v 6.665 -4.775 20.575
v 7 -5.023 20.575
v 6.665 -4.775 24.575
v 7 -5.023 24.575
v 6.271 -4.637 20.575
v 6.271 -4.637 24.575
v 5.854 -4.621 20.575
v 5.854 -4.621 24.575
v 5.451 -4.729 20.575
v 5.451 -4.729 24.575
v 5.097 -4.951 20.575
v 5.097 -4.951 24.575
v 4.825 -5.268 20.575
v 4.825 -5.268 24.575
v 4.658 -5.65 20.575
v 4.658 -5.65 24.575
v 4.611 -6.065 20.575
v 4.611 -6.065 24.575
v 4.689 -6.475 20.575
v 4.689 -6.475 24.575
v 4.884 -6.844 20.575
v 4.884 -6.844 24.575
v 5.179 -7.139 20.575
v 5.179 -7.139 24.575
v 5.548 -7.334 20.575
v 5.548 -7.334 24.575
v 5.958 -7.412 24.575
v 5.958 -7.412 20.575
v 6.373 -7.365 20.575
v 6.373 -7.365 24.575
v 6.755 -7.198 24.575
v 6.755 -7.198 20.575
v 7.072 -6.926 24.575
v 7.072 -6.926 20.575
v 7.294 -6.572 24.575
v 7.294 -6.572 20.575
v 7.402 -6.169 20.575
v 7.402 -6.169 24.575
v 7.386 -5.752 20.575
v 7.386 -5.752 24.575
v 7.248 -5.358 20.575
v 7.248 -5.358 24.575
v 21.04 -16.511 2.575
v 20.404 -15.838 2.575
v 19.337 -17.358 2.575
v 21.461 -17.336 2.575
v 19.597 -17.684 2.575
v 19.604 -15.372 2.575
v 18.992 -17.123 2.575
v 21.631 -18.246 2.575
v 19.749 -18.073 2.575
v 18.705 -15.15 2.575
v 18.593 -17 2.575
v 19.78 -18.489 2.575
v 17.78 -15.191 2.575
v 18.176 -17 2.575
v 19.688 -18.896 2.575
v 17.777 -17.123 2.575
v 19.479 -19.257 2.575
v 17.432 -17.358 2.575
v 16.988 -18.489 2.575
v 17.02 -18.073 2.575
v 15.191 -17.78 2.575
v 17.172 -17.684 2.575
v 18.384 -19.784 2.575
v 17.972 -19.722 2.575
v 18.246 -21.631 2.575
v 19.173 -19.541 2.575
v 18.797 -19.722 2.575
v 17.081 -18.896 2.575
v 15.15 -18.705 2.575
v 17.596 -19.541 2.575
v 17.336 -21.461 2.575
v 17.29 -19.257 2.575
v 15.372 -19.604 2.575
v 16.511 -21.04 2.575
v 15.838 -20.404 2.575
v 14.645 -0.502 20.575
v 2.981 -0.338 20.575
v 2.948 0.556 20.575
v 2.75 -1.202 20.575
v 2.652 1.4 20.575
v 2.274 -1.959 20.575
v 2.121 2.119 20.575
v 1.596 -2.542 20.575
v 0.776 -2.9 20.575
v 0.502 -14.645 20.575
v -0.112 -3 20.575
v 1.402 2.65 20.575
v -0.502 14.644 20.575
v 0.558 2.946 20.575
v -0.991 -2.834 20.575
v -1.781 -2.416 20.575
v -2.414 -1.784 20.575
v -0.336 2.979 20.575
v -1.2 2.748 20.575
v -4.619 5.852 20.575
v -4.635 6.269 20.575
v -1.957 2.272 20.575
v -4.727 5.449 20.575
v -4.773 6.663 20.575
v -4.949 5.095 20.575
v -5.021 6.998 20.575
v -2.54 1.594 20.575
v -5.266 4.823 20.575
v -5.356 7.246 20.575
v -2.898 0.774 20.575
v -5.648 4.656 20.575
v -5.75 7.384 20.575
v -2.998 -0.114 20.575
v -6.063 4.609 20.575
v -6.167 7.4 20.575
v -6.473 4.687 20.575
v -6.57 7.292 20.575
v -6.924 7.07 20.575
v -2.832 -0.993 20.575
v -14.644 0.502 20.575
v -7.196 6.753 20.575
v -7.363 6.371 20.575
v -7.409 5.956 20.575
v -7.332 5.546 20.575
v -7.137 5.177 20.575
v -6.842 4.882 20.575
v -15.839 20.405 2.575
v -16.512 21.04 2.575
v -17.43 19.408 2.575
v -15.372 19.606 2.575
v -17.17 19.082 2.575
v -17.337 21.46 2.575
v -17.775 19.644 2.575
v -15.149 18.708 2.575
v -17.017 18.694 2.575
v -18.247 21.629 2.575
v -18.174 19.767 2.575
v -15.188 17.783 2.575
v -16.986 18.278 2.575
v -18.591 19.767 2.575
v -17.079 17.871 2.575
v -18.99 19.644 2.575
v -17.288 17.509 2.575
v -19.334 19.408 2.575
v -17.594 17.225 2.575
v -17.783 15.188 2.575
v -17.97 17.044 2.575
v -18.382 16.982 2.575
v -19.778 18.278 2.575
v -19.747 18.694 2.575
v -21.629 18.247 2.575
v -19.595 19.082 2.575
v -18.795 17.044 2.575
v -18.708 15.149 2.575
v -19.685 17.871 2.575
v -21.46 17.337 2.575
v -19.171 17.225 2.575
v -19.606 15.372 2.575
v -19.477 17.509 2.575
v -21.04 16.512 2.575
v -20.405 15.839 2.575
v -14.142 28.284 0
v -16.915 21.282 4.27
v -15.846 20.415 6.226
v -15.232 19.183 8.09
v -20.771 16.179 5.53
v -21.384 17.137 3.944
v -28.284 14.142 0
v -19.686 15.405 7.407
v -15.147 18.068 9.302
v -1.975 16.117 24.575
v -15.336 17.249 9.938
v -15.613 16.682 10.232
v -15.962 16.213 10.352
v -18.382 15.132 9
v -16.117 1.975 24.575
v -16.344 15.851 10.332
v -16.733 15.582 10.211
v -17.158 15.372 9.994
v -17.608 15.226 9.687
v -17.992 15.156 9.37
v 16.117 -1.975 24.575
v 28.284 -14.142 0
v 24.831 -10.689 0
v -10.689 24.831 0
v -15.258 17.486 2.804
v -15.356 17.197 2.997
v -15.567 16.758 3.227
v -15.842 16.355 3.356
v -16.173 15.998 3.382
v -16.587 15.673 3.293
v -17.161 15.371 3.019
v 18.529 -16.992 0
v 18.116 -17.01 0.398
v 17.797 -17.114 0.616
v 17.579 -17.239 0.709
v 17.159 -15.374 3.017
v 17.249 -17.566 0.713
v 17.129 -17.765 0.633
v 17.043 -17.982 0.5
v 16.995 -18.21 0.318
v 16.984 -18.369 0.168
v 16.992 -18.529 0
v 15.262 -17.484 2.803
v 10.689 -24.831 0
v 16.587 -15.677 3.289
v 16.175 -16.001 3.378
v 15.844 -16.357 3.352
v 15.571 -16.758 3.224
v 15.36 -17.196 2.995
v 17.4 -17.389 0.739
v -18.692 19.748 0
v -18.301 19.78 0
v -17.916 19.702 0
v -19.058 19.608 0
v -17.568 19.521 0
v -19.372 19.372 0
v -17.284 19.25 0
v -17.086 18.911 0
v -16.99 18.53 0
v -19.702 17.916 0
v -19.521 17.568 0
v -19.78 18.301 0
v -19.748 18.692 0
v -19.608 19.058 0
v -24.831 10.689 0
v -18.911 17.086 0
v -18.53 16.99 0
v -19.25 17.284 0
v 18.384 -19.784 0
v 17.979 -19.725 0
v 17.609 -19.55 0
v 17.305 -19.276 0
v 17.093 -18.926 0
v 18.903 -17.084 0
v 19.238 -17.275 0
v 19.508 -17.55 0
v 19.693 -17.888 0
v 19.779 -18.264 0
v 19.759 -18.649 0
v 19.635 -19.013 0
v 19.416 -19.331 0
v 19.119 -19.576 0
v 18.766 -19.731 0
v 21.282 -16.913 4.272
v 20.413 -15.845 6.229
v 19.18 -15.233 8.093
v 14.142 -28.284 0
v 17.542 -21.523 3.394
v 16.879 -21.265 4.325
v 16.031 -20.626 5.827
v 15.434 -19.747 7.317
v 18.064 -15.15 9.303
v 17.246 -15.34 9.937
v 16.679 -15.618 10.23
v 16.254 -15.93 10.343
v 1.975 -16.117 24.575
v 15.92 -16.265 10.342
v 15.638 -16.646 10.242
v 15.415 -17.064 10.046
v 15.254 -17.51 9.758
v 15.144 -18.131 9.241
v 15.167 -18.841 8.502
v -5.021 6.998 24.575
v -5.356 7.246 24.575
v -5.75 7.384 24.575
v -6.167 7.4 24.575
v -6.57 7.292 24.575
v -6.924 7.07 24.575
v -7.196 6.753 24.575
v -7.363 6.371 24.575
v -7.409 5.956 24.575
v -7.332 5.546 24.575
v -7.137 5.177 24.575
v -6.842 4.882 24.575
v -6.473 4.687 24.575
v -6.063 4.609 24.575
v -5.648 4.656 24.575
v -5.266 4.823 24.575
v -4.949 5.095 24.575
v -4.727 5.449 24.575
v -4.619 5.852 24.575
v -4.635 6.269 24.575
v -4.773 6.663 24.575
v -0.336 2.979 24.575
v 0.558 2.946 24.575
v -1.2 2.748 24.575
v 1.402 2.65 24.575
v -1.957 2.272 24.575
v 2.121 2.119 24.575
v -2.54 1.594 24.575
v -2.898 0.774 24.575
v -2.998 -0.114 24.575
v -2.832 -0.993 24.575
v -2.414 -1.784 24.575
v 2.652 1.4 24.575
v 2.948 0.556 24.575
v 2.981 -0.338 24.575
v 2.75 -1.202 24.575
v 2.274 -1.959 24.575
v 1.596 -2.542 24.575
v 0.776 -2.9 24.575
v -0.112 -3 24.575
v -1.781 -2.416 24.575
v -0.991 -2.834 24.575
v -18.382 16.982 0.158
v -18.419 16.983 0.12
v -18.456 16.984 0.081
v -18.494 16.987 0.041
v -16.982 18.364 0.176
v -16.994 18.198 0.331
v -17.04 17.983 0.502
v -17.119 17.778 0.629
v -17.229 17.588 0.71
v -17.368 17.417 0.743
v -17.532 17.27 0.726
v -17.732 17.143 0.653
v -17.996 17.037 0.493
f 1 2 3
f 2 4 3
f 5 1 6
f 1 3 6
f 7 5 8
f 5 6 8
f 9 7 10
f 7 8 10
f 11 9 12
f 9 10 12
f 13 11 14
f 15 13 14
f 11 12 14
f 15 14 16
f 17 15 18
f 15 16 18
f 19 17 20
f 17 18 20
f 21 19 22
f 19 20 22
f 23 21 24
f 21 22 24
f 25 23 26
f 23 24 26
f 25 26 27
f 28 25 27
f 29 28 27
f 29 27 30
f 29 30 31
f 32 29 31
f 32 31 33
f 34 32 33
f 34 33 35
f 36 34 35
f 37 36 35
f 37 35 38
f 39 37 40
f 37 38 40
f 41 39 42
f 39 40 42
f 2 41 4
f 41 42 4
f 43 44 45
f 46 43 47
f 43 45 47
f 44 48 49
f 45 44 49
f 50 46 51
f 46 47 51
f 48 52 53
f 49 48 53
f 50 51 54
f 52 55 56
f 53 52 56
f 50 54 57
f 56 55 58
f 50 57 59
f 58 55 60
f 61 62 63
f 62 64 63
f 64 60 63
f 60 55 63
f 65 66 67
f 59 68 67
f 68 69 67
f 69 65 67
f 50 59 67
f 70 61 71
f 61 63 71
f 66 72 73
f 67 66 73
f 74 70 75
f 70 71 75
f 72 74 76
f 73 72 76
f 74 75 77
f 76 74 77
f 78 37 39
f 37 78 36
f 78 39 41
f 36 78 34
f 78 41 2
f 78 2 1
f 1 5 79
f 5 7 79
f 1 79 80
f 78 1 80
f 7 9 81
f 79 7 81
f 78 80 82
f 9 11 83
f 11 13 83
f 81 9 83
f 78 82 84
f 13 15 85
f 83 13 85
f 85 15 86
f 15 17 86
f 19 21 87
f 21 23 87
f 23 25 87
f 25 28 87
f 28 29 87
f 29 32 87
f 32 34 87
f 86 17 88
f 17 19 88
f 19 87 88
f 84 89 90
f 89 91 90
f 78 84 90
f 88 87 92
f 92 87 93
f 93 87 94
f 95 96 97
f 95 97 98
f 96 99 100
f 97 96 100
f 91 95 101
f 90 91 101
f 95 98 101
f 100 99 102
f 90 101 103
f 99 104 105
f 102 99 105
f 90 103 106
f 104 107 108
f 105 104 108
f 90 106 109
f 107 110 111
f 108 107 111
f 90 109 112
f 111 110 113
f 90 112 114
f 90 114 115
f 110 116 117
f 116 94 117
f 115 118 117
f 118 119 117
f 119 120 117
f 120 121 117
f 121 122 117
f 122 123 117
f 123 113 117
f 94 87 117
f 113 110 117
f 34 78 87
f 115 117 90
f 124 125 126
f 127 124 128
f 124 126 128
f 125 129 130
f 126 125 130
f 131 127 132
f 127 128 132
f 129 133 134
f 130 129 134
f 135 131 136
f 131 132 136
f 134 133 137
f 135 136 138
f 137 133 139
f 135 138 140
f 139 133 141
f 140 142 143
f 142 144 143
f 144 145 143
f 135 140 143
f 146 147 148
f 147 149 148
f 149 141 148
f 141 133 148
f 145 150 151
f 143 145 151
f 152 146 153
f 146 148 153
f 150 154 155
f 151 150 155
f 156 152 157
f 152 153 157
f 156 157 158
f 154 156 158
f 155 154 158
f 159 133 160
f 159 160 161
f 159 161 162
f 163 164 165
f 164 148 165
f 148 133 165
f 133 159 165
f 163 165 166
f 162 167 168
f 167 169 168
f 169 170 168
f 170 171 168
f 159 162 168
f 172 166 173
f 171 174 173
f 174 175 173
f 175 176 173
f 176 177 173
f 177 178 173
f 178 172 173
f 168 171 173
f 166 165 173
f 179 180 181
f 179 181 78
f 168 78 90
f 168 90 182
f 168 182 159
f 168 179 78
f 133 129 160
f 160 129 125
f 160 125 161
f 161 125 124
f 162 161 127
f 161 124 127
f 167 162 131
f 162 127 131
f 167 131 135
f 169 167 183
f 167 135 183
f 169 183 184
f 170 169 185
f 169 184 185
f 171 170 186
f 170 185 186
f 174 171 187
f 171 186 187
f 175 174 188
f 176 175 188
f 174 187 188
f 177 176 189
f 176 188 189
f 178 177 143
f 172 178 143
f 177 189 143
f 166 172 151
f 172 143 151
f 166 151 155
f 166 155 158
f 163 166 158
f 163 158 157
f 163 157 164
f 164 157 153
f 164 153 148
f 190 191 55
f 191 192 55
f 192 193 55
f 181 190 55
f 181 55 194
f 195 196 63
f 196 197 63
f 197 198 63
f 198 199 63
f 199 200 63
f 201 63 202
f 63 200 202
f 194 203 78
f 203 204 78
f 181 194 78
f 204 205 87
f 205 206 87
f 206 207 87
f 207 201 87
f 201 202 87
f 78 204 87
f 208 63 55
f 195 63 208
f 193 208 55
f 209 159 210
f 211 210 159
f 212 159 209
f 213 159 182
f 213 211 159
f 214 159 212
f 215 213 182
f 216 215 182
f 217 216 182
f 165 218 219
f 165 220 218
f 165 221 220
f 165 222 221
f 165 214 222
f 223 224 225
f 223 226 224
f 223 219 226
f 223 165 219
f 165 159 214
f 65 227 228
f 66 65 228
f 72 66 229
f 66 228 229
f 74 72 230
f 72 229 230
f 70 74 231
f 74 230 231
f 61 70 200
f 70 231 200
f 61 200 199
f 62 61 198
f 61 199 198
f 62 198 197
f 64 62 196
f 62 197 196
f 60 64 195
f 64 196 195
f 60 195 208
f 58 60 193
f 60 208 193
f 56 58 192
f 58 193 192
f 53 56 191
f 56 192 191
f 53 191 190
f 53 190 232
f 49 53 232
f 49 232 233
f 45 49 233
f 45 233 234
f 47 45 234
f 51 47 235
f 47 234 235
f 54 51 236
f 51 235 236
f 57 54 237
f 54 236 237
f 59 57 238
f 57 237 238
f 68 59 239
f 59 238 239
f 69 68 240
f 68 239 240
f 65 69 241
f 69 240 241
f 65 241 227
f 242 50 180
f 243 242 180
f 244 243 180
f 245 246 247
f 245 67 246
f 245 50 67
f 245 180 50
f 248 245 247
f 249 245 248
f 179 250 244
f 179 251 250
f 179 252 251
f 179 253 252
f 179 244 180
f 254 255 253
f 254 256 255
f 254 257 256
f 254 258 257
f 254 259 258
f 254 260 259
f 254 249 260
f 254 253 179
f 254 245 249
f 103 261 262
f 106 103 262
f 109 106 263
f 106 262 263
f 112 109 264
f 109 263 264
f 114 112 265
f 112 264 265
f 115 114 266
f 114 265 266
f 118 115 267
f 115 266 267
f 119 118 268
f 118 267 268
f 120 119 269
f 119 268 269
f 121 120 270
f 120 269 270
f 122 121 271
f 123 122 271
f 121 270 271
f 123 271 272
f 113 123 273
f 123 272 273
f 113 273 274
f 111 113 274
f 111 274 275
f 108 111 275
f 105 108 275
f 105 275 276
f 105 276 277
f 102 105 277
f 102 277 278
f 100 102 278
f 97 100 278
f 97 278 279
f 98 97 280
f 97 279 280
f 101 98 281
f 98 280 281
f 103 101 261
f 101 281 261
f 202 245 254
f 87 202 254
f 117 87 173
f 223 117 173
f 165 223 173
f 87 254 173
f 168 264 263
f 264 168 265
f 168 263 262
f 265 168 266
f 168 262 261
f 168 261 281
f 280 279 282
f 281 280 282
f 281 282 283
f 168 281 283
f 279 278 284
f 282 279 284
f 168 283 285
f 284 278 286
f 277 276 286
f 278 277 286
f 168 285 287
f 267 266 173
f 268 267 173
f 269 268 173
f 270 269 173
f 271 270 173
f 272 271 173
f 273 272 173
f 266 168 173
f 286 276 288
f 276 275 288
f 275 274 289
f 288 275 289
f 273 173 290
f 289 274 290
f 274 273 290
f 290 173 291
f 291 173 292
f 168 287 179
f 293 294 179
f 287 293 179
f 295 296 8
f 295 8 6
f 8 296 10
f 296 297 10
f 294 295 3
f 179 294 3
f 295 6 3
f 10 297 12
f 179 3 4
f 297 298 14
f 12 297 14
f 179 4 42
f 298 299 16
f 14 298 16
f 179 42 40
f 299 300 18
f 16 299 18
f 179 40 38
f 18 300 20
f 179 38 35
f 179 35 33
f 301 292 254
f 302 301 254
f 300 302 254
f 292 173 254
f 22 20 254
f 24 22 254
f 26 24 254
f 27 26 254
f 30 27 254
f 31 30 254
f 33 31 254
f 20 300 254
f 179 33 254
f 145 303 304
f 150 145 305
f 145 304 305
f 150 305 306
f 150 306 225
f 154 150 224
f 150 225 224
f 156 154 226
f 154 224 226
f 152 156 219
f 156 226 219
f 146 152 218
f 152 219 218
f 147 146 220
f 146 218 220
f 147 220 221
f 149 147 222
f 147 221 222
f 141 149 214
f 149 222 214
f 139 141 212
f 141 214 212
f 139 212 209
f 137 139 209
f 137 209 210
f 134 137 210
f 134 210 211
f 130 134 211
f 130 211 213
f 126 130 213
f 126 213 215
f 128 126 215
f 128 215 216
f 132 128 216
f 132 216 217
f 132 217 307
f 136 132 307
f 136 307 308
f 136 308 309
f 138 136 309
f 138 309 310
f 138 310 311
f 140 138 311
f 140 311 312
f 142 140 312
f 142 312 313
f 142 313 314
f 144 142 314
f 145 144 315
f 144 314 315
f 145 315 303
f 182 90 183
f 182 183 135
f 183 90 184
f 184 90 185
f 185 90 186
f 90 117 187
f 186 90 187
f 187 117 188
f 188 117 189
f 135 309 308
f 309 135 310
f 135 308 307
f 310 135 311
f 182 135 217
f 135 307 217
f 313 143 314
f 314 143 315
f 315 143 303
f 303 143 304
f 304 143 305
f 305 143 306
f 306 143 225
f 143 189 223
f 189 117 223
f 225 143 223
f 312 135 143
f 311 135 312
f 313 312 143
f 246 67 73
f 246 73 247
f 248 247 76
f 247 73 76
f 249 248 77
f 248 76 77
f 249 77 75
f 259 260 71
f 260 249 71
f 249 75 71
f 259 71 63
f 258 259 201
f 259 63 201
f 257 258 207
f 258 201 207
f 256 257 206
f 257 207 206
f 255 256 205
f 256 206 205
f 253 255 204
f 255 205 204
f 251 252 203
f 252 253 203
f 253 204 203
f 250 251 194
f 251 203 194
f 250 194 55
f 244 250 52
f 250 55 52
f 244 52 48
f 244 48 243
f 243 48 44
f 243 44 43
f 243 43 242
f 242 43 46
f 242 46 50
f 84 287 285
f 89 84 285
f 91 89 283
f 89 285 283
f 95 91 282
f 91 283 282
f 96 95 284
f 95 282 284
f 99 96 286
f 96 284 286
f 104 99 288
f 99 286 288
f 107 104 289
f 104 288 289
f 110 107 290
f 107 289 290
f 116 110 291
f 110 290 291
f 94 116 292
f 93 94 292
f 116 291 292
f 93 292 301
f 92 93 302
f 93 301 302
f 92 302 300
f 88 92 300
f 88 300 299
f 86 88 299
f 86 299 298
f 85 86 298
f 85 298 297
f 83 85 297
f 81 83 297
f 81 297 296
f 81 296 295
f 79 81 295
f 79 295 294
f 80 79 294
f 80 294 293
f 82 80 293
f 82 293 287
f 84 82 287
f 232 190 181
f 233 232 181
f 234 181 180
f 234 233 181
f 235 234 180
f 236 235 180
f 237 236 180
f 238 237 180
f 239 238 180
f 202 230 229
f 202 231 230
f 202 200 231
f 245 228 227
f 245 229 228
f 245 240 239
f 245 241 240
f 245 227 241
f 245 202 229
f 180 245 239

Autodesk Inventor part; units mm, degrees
ref_plane "YZ Plane" through (0, 0, 0) normal (1, 0, 0) x (0, 1, 0)
ref_plane "XZ Plane" through (0, 0, 0) normal (0, 1, 0) x (-1, 0, 0)
ref_plane "XY Plane" through (0, 0, 0) normal (0, 0, 1) x (1, 0, 0)
ref_plane "Work Plane1" through (0, 0, 0) normal (0, 0, 1) x (1, 0, 0)
sketch "Sketch1" plane through (0, 0, 0) normal (0, 0, 1) x (1, 0, 0)
  circle A0 centre (18.3844, -18.3844) radius 1.4 projected
  circle A1 centre (-18.3822, 18.3822) radius 1.4 projected
  arc A2 (9.6814, 2.5019) -> (1.0662, 9.9409) centre (9.4999, 11) ccw projected
  arc A3 (1.0662, 9.9409) -> (9.6814, 2.5019) centre (0, -0.0021) ccw projected
  circle A4 centre (0, 0) radius 30 projected
ref_plane "Work Plane3" through (18.3844, -18.3844, 0) normal (0.7071, 0.7071, 0) x (-0.7071, 0.7071, 0)
ref_plane "Work Plane2" through (0, 0, 0) normal (0, 0, 1) x (1, 0, 0)
sketch "Sketch2" plane through (18.3844, -18.3844, 0) normal (0.7071, 0.7071, 0) x (-0.7071, 0.7071, 0)
  line L0 (55.9994, 0) -> (-4.0006, 0) projected
  line L1 (-4.0006, 0) -> (13.2067, 24.5746)
  line L2 (-4.0006, 0) -> (25.9994, 0) construction
  line L3 (22.8954, 10) -> (30.4529, 10) projected
  line L4 (-36.9123, 0) -> (106.4847, 0) projected
  line L5 (55.9994, 0) -> (38.7921, 24.5746)
  line L6 (55.9994, 0) -> (85.9994, 0) construction
  line L7 (38.7921, 24.5746) -> (13.2067, 24.5746)
  line L8 (0.8825, 0) -> (15.289, 20.5746)
  line L9 (15.289, 20.5746) -> (36.7098, 20.5746)
  line L10 (36.7098, 20.5746) -> (51.1163, 0)
  line L11 (55.9994, 0) -> (51.1163, 0)
  line L12 (0.8825, 0) -> (-4.0006, 0)
  point P0 (25.9994, 0)
  point P1 (0.8825, 0)
  point P2 (51.1163, 0)
  dimension "d1" = 30
  dimension "d2" = 55
  dimension "d3" = 125
  dimension "d5" = 4
  dimension "d6" = 4
  dimension "d7" = 4
extrude "Extrusion1" add sketch "Sketch2" along normal mid plane 20 contours L0 L10 L9 L8 L1 L7 L5
sketch "Sketch3" plane through (16.1169, -1.9747, 24.5746) normal (0, 0, 1) x (0.7071, 0.7071, 0)
  circle A0 centre (-10, 38.7891) radius 1.4 projected
  circle A1 centre (-10, -13.2067) radius 1.4 projected
  point P0 (-10, 12.7927)
hole "Hole1" at (-18.3822, 18.3822, 24.5746) at (18.3844, -18.3844, 24.5746) direction (0, 0, -1) diameter 2.8 end through all counterbore diameter 6.5 counterbore depth 22
sketch "Sketch4" plane through (16.1169, -1.9747, 24.5746) normal (0, 0, 1) x (0.7071, 0.7071, 0)
  circle A0 centre (-10.0015, 21.2913) radius 1.9 projected
  line L0 (0, 0) -> (-20, 0) projected
  line L1 (0, 25.5854) -> (0, 0) projected
  line L2 (-20, 25.5854) -> (0, 25.5854) projected
  line L3 (-20, 0) -> (-20, 25.5854) projected
  circle A1 centre (-10.0015, 4.2912) radius 1.9 projected
  circle A2 centre (-10.0015, 12.7912) radius 3 projected
  circle A3 centre (-10.0015, 21.2913) radius 1.4
  circle A4 centre (-10.0015, 4.2912) radius 1.9
  circle A5 centre (-10.0015, 4.2912) radius 1.4
  point P0 (-10, 12.7927)
  dimension "d17" = 2.8
  dimension "d18" = 2.8
extrude "Extrusion2" cut sketch "Sketch4" against normal blind 20 contours A2 | A3 | A5
properties part number "Anglerfish_Lightplate_Tislinkbridge"
